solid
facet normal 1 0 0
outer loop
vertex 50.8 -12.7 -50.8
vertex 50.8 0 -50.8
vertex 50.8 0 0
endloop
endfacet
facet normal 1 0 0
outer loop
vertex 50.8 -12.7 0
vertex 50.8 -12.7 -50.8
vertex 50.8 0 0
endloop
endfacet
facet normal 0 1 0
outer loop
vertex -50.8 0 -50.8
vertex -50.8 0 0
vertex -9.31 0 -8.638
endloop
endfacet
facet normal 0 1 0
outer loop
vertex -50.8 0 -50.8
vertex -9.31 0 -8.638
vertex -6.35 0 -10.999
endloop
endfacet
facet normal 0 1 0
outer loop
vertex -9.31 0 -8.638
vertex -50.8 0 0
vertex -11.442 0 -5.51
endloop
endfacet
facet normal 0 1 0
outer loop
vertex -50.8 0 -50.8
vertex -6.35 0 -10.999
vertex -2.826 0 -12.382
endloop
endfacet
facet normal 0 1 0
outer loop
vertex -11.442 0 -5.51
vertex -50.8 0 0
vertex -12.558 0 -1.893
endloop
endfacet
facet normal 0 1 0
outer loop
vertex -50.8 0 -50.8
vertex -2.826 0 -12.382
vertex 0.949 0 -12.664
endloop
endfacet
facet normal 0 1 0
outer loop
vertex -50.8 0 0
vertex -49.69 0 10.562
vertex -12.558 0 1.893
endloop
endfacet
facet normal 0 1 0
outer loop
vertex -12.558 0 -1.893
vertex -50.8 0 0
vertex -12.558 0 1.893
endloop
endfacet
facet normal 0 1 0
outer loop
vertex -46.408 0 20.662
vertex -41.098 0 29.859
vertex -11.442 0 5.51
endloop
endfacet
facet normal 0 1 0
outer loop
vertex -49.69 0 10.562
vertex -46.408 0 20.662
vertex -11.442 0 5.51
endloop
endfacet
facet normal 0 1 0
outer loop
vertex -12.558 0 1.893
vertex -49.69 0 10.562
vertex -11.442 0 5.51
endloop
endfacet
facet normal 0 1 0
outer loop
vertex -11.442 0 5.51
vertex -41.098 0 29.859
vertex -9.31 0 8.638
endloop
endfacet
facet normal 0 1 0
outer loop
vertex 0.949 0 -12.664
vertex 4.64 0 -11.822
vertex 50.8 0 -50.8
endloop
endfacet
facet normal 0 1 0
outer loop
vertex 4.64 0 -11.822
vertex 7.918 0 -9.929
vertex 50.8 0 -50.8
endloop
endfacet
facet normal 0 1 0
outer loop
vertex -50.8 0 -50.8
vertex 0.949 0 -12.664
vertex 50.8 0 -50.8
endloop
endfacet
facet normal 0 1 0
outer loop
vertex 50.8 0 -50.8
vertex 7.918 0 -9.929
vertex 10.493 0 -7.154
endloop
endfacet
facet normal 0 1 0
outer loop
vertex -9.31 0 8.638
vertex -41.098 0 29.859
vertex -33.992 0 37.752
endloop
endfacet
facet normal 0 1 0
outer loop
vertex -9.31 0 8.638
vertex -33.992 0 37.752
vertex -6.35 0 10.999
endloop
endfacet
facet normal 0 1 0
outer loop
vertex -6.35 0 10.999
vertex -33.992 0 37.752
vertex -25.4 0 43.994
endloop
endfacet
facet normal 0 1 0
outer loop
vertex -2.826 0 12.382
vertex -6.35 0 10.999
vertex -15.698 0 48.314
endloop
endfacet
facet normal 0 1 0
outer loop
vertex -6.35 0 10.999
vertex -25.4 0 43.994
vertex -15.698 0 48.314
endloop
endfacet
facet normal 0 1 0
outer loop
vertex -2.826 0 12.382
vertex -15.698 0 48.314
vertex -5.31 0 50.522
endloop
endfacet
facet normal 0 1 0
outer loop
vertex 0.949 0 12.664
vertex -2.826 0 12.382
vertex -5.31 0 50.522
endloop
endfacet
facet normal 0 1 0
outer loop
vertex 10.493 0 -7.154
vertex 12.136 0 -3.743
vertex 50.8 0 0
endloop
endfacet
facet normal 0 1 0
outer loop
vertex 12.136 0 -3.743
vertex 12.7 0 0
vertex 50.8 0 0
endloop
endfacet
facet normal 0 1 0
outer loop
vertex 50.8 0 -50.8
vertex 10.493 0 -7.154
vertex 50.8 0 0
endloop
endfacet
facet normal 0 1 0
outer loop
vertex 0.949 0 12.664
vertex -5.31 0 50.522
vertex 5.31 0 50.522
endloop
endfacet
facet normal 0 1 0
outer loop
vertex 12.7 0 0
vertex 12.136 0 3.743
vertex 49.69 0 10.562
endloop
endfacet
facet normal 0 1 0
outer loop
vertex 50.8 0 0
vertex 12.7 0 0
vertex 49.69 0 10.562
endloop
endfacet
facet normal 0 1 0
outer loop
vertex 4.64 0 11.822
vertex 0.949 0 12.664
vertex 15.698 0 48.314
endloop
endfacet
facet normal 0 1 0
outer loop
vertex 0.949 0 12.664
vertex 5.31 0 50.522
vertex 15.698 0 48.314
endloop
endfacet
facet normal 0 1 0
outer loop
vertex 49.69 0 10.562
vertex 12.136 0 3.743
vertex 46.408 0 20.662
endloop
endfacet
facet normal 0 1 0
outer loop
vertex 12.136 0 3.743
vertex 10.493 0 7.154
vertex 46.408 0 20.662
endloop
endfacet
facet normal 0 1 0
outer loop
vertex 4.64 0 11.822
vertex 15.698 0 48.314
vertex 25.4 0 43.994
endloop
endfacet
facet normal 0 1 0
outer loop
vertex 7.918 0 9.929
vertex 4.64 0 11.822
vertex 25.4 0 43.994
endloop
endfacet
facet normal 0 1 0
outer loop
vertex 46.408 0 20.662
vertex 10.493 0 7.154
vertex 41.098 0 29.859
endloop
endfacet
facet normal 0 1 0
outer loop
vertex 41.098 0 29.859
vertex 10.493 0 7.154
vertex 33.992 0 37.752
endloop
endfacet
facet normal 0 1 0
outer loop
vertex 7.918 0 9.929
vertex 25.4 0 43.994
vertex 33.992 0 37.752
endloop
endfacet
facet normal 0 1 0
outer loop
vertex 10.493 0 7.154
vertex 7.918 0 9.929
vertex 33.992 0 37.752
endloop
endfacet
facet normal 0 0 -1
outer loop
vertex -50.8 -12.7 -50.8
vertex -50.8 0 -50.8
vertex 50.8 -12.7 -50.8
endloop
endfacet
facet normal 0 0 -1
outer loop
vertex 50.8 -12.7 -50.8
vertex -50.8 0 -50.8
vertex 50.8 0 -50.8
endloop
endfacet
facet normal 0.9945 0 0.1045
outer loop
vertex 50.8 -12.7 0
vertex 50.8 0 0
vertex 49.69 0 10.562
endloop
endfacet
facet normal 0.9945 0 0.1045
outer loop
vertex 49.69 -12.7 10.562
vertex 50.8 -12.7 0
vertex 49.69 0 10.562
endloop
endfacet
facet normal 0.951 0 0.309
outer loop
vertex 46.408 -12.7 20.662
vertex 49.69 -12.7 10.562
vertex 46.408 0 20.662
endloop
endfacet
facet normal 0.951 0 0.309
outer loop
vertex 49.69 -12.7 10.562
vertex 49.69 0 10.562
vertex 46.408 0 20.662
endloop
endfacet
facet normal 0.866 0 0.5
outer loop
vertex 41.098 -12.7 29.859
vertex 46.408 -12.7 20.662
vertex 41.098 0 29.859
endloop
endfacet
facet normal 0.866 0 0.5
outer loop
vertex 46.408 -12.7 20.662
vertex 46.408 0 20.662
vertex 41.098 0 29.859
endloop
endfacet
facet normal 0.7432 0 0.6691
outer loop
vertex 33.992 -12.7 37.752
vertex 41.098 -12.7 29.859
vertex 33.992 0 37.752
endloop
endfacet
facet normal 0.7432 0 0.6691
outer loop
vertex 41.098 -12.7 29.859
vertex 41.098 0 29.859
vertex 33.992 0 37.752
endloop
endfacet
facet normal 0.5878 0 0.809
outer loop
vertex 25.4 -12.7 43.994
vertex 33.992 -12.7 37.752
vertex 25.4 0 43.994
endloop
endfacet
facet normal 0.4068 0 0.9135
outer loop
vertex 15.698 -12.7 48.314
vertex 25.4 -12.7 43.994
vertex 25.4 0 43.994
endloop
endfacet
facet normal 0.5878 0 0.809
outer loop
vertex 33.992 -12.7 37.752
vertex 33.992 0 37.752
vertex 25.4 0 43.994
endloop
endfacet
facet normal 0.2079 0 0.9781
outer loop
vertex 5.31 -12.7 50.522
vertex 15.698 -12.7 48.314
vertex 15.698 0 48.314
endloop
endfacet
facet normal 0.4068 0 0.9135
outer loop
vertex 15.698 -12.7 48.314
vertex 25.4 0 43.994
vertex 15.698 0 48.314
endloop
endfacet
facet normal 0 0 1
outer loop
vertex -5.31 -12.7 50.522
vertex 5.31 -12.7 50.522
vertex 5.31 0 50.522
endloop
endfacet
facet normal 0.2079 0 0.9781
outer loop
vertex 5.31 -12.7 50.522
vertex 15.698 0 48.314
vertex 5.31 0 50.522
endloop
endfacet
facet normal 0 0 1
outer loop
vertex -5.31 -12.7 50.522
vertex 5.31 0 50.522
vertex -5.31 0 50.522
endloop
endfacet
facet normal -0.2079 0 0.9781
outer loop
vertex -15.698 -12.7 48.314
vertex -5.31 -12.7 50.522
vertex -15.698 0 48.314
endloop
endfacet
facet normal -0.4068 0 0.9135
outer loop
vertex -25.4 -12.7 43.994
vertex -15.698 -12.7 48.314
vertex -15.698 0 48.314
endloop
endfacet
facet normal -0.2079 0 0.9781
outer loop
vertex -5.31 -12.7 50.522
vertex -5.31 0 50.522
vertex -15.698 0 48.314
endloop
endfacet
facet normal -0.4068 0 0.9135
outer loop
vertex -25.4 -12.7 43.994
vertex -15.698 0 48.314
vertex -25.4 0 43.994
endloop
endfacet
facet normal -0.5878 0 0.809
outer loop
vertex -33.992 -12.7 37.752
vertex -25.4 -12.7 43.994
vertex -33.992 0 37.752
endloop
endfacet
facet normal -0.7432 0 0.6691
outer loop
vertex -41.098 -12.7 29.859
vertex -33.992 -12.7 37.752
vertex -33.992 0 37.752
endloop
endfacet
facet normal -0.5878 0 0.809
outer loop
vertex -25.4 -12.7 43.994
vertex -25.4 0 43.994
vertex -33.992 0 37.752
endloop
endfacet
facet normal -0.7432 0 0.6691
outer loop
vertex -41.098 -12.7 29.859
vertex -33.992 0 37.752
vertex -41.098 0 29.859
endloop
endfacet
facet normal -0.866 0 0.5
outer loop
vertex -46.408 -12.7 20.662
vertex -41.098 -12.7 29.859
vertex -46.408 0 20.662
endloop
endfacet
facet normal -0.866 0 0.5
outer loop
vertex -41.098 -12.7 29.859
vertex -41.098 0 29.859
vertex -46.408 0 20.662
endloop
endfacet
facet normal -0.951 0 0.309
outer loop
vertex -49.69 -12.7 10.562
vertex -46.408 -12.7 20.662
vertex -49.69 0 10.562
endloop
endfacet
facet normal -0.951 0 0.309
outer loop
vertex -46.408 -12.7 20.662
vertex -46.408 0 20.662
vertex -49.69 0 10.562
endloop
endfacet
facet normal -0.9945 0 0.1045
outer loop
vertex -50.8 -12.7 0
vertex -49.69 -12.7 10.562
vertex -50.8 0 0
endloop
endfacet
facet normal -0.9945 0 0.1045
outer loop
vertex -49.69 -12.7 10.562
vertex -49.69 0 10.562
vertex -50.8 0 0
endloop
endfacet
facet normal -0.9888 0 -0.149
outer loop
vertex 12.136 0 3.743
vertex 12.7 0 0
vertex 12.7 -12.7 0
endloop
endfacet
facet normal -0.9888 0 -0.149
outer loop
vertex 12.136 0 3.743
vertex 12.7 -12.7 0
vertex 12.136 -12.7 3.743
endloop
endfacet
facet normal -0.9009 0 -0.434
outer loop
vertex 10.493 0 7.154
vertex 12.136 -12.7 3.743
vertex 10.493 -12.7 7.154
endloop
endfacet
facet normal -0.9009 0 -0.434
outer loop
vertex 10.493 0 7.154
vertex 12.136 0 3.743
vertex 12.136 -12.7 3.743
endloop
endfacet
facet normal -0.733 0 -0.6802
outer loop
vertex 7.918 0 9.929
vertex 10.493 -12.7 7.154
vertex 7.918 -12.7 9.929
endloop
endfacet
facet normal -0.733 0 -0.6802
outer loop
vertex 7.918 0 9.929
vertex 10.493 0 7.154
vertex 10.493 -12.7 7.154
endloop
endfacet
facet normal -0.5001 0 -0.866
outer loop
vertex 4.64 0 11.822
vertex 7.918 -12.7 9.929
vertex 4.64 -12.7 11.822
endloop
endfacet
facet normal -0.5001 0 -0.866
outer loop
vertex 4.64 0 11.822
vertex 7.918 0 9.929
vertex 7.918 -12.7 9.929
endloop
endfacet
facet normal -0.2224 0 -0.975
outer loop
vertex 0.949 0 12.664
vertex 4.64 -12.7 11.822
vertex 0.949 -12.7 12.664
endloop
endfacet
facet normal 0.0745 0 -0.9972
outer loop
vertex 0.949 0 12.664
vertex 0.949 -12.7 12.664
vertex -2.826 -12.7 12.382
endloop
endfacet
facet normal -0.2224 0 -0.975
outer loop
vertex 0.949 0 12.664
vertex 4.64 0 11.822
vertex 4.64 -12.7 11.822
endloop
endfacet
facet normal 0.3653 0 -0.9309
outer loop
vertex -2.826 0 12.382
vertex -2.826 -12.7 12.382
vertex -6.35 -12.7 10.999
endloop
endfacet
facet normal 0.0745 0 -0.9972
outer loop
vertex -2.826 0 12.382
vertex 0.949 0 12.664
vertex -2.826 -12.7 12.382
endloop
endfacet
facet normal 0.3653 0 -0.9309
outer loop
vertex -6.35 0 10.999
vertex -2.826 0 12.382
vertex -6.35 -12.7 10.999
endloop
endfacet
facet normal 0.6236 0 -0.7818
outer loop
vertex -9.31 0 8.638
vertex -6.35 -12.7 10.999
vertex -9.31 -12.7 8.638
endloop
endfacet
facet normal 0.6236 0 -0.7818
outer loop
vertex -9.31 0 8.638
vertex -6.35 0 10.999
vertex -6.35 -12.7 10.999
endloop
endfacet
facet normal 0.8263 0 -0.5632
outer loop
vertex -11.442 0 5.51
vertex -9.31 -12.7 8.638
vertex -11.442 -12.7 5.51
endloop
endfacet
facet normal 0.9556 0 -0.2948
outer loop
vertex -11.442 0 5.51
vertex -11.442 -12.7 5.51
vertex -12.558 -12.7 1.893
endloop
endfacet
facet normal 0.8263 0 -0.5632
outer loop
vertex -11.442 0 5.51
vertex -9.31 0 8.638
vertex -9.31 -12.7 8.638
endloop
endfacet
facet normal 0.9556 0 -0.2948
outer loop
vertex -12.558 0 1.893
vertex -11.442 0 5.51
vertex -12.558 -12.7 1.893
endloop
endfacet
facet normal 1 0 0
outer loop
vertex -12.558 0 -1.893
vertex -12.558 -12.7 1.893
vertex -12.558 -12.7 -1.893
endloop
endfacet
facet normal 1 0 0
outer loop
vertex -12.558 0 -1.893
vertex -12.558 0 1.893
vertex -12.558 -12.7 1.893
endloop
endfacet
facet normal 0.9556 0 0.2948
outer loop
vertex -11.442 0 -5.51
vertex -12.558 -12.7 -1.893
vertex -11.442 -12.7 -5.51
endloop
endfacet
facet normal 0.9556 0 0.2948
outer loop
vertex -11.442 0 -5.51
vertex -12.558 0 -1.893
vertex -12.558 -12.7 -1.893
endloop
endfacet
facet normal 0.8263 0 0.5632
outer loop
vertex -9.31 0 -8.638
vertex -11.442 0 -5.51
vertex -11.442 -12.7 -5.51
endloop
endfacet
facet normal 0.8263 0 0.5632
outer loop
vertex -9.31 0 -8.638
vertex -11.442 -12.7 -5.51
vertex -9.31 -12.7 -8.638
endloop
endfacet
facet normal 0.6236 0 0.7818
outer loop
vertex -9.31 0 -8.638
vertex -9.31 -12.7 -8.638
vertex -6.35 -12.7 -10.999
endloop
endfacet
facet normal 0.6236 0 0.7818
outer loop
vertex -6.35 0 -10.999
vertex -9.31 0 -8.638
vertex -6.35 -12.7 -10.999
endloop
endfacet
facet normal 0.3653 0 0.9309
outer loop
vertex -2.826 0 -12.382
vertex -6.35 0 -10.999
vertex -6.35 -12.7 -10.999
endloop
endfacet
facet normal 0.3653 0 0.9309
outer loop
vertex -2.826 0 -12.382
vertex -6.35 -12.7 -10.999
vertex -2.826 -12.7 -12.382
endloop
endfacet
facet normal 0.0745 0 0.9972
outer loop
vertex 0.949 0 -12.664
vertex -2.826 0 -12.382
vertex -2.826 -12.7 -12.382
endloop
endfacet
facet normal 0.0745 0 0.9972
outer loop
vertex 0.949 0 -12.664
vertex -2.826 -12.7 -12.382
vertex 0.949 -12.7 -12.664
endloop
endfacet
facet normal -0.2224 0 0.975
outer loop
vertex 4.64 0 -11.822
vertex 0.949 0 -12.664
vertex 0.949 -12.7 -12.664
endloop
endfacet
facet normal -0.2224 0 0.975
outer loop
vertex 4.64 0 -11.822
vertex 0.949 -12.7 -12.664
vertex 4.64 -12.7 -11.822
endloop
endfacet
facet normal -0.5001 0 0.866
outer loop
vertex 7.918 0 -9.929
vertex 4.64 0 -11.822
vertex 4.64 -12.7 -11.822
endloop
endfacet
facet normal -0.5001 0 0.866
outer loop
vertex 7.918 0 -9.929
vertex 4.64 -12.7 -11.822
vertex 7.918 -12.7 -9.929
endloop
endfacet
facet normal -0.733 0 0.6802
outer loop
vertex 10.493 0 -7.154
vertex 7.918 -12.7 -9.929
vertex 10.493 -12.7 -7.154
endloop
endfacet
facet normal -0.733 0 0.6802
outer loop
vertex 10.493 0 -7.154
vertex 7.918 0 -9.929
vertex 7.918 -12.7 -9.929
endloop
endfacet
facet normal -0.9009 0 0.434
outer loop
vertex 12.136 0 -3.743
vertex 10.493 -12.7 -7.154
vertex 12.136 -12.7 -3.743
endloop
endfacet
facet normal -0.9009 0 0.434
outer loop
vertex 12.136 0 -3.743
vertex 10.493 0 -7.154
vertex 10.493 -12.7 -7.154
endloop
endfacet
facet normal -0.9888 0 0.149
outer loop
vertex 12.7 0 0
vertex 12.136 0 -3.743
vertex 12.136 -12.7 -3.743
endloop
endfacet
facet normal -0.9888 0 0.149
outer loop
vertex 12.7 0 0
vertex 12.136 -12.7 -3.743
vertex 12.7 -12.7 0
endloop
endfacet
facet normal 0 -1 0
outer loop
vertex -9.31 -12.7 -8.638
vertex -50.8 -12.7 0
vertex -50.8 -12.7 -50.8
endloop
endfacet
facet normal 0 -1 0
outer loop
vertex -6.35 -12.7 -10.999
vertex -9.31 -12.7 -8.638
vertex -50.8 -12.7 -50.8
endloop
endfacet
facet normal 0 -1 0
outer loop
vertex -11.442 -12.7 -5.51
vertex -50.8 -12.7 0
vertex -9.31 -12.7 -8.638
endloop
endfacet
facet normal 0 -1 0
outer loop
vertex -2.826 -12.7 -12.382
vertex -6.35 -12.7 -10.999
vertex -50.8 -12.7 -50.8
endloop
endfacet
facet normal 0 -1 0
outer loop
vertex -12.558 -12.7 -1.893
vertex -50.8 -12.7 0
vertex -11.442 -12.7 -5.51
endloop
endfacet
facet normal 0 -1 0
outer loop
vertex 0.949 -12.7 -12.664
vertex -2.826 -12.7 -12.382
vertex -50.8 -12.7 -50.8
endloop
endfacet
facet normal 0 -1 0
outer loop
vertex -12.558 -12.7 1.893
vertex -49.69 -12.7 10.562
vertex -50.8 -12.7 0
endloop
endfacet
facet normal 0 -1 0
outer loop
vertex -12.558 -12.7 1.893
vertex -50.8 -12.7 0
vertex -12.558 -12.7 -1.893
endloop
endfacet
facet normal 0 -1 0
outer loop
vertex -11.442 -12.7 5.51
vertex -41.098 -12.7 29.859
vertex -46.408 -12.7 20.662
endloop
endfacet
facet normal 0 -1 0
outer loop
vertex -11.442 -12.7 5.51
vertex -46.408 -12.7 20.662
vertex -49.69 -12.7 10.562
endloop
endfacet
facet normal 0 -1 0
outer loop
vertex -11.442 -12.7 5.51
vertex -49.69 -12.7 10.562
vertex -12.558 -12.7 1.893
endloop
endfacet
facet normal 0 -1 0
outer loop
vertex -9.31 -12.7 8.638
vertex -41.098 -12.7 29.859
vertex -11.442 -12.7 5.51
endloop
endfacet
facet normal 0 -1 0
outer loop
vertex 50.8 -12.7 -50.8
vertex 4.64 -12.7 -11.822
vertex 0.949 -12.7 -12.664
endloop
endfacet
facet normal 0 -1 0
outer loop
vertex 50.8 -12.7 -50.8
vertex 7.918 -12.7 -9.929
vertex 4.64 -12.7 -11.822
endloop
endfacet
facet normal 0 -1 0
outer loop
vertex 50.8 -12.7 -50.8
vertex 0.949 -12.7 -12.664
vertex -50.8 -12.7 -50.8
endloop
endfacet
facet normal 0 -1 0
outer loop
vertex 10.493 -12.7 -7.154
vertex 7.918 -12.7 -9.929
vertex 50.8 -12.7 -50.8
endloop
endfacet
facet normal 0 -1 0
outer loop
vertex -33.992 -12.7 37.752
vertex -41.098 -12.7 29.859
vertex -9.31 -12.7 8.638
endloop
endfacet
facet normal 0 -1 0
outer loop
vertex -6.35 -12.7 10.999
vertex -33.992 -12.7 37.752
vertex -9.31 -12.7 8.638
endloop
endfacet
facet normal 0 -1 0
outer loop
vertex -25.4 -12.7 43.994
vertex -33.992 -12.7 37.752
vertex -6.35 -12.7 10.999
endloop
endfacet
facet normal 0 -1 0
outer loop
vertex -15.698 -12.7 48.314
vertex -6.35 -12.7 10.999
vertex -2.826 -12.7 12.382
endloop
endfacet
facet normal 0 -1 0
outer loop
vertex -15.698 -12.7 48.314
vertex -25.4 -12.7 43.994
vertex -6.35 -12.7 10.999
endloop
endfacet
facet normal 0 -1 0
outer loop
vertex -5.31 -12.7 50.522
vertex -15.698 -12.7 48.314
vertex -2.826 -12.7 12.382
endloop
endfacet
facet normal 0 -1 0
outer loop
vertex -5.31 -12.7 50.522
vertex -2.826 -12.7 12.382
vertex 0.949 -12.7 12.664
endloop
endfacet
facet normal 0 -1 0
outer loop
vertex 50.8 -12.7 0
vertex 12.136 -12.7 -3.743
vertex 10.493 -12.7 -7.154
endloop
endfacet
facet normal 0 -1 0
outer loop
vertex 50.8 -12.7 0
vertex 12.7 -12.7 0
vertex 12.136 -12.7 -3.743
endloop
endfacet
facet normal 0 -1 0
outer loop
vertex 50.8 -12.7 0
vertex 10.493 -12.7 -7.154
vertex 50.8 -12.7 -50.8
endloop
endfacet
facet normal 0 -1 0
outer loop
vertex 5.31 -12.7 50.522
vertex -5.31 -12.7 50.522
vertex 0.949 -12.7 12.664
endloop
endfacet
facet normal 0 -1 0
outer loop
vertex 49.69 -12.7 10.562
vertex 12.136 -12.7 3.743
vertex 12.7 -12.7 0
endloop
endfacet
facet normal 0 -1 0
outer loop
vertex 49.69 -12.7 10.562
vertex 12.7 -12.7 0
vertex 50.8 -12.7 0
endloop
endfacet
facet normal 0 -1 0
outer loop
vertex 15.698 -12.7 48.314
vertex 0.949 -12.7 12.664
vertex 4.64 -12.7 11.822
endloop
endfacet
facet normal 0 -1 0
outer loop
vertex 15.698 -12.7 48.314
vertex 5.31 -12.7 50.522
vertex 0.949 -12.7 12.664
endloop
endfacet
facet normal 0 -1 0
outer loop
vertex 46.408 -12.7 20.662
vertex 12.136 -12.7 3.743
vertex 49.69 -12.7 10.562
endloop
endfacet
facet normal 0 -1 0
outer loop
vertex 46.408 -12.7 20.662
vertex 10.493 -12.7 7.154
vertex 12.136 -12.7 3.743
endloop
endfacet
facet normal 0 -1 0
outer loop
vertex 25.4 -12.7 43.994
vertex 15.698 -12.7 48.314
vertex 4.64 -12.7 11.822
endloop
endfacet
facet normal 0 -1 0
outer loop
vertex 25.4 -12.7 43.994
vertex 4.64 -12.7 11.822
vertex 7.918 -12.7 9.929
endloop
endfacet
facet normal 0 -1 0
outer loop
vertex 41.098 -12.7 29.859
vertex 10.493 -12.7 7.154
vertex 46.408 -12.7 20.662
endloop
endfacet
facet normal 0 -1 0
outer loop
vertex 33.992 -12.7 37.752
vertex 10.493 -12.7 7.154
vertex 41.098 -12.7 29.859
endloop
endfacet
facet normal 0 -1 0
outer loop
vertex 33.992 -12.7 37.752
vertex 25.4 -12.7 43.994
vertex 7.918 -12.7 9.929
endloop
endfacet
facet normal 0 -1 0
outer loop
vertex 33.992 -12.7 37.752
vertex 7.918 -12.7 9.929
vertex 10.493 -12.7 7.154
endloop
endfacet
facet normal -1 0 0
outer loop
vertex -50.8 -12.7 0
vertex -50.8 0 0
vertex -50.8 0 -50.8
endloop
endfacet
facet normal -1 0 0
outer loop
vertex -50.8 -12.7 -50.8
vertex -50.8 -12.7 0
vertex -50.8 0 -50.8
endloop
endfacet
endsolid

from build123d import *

# Parameters (mm, degrees)
F0_R     = 12.7
F1_DEPTH = 12.7


with BuildPart() as f1:
    # F0 (on Front) → F1 (new body)
    with BuildSketch(Plane.XZ):
        with BuildLine():
            ThreePointArc((50.8, 0), (0, 50.8), (-50.8, 0))
            Line((-50.8, 0), (-50.8, -50.8))
            Line((-50.8, -50.8), (50.8, -50.8))
            Line((50.8, -50.8), (50.8, 0))
        make_face()
        Circle(F0_R, mode=Mode.SUBTRACT)
    extrude(amount=F1_DEPTH)


solid = f1.part
